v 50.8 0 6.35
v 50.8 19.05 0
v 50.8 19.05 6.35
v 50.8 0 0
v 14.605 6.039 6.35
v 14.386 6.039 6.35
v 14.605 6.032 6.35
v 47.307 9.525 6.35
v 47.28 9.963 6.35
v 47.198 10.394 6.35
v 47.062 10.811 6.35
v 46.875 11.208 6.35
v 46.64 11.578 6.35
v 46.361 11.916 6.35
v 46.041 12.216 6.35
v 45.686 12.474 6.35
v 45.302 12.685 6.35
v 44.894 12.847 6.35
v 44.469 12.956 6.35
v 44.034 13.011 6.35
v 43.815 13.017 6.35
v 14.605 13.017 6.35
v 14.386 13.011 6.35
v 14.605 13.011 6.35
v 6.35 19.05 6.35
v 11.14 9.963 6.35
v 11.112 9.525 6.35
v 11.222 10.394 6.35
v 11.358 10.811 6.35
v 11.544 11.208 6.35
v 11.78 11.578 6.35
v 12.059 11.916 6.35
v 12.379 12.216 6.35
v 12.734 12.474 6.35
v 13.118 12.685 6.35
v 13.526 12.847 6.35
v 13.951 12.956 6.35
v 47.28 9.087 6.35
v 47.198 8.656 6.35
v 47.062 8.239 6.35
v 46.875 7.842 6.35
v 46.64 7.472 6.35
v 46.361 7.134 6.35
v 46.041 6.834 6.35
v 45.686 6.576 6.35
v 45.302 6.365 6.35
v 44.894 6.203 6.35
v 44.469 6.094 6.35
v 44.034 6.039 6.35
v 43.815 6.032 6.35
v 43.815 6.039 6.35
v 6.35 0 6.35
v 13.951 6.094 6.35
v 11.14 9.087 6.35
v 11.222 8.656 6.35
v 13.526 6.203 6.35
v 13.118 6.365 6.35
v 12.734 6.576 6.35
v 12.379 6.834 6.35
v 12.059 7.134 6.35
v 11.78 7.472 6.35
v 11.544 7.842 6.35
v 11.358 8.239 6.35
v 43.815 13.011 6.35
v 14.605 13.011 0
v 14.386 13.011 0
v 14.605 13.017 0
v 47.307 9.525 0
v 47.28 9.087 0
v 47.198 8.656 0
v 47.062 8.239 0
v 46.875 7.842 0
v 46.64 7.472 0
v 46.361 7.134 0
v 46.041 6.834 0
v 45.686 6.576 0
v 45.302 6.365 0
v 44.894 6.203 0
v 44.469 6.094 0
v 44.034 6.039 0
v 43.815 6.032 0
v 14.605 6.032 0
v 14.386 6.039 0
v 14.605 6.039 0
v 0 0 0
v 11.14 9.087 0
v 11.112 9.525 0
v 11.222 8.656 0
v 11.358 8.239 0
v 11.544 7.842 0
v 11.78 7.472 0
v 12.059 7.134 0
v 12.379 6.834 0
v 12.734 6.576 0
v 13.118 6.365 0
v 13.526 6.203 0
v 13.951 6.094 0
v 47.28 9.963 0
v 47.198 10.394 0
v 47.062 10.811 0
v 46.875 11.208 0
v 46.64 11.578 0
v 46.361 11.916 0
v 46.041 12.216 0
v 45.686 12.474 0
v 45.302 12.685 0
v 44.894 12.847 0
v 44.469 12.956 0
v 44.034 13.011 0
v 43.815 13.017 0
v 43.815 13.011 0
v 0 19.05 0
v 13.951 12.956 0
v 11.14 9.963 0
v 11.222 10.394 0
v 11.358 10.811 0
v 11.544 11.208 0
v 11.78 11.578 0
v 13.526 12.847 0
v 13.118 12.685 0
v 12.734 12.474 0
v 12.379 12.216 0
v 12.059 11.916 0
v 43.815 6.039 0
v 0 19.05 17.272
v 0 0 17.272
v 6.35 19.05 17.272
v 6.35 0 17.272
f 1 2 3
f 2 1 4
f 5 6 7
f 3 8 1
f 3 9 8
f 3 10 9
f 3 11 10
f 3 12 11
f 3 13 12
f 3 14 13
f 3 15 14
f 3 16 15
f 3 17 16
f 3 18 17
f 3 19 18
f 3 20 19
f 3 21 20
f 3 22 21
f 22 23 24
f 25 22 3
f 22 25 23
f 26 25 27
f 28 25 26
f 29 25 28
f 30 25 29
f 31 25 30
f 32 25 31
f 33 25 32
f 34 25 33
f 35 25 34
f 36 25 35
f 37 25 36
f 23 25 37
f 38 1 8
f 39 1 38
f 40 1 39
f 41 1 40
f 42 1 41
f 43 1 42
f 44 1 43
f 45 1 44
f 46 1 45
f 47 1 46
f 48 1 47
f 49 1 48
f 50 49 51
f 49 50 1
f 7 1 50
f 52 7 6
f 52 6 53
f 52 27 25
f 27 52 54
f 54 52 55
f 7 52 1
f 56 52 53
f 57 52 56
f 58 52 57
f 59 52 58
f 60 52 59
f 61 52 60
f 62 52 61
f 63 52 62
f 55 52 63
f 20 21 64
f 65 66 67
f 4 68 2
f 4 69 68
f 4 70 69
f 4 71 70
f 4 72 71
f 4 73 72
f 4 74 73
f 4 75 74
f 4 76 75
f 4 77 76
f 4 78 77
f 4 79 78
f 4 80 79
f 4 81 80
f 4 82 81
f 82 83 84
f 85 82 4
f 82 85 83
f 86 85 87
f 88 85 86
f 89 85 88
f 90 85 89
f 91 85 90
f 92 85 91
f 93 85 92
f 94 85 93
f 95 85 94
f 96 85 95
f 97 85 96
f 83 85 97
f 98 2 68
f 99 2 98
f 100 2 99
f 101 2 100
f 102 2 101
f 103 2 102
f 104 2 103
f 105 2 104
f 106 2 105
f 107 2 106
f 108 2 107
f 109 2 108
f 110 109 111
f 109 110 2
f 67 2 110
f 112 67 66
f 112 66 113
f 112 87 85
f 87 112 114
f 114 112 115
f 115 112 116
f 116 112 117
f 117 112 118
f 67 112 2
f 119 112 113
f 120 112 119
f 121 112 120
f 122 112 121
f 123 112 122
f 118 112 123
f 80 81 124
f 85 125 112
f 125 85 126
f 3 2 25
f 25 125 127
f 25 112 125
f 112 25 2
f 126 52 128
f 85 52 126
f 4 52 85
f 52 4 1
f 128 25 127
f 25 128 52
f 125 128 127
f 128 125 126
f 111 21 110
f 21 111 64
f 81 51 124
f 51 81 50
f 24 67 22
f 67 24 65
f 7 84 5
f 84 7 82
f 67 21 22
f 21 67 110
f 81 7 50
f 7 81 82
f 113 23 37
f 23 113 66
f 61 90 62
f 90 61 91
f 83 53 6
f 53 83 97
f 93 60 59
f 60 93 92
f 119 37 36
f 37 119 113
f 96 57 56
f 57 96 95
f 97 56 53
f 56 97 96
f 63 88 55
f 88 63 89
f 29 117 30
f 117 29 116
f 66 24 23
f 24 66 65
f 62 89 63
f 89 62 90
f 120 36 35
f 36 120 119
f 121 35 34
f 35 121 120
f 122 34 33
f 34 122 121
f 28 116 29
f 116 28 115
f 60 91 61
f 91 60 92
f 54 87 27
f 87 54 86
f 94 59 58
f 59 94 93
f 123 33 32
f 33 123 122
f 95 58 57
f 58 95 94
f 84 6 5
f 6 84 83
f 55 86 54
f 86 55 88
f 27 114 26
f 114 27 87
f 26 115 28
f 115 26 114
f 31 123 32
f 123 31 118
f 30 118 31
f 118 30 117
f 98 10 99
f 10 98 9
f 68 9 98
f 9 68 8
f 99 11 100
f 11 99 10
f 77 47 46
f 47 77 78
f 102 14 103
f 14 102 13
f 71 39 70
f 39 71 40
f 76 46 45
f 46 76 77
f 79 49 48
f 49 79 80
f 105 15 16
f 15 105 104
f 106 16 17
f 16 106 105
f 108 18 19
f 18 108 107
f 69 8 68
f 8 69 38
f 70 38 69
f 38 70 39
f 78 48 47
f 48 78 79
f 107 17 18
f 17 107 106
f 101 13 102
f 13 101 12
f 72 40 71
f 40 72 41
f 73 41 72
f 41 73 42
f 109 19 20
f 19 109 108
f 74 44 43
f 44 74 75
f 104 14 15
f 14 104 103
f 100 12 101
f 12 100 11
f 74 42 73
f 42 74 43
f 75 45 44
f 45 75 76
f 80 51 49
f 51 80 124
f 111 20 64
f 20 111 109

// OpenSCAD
$fn = 50;
//$fa = 0.01;
//$fs = 0.5;


in=25.4;
l=2.0*in;
w=0.75*in;
h=0.25*in;

l2=0.25*in;
h2=0.68*in;

slotW=0.275*in;
slotL=1.15*in;
d=1*in;

dHole=0.10*in;
dLip=0.935*in;

d8=0.136*in;
d4=0.201*in;
d40=0.0785*in;
dStand=0.2*in;
hStand=h+0.1*in;

render(convexity=3)
{


		difference()
		{
		union()
		{
		cube([l,w,h], center=false); //Body
		cube([l2,w,h2], center=false); //Body 
		}
		translate([slotL/2, w/2-slotW/2, 0]) cube([slotL,slotW,h], center=false); //Slot
		translate([slotL/2, w/2, 0]) cylinder(h=2*in, r=slotW/2); //Hole
		translate([3/2*slotL, w/2, 0]) cylinder(h=2*in, r=slotW/2); //Hole


		}


}
